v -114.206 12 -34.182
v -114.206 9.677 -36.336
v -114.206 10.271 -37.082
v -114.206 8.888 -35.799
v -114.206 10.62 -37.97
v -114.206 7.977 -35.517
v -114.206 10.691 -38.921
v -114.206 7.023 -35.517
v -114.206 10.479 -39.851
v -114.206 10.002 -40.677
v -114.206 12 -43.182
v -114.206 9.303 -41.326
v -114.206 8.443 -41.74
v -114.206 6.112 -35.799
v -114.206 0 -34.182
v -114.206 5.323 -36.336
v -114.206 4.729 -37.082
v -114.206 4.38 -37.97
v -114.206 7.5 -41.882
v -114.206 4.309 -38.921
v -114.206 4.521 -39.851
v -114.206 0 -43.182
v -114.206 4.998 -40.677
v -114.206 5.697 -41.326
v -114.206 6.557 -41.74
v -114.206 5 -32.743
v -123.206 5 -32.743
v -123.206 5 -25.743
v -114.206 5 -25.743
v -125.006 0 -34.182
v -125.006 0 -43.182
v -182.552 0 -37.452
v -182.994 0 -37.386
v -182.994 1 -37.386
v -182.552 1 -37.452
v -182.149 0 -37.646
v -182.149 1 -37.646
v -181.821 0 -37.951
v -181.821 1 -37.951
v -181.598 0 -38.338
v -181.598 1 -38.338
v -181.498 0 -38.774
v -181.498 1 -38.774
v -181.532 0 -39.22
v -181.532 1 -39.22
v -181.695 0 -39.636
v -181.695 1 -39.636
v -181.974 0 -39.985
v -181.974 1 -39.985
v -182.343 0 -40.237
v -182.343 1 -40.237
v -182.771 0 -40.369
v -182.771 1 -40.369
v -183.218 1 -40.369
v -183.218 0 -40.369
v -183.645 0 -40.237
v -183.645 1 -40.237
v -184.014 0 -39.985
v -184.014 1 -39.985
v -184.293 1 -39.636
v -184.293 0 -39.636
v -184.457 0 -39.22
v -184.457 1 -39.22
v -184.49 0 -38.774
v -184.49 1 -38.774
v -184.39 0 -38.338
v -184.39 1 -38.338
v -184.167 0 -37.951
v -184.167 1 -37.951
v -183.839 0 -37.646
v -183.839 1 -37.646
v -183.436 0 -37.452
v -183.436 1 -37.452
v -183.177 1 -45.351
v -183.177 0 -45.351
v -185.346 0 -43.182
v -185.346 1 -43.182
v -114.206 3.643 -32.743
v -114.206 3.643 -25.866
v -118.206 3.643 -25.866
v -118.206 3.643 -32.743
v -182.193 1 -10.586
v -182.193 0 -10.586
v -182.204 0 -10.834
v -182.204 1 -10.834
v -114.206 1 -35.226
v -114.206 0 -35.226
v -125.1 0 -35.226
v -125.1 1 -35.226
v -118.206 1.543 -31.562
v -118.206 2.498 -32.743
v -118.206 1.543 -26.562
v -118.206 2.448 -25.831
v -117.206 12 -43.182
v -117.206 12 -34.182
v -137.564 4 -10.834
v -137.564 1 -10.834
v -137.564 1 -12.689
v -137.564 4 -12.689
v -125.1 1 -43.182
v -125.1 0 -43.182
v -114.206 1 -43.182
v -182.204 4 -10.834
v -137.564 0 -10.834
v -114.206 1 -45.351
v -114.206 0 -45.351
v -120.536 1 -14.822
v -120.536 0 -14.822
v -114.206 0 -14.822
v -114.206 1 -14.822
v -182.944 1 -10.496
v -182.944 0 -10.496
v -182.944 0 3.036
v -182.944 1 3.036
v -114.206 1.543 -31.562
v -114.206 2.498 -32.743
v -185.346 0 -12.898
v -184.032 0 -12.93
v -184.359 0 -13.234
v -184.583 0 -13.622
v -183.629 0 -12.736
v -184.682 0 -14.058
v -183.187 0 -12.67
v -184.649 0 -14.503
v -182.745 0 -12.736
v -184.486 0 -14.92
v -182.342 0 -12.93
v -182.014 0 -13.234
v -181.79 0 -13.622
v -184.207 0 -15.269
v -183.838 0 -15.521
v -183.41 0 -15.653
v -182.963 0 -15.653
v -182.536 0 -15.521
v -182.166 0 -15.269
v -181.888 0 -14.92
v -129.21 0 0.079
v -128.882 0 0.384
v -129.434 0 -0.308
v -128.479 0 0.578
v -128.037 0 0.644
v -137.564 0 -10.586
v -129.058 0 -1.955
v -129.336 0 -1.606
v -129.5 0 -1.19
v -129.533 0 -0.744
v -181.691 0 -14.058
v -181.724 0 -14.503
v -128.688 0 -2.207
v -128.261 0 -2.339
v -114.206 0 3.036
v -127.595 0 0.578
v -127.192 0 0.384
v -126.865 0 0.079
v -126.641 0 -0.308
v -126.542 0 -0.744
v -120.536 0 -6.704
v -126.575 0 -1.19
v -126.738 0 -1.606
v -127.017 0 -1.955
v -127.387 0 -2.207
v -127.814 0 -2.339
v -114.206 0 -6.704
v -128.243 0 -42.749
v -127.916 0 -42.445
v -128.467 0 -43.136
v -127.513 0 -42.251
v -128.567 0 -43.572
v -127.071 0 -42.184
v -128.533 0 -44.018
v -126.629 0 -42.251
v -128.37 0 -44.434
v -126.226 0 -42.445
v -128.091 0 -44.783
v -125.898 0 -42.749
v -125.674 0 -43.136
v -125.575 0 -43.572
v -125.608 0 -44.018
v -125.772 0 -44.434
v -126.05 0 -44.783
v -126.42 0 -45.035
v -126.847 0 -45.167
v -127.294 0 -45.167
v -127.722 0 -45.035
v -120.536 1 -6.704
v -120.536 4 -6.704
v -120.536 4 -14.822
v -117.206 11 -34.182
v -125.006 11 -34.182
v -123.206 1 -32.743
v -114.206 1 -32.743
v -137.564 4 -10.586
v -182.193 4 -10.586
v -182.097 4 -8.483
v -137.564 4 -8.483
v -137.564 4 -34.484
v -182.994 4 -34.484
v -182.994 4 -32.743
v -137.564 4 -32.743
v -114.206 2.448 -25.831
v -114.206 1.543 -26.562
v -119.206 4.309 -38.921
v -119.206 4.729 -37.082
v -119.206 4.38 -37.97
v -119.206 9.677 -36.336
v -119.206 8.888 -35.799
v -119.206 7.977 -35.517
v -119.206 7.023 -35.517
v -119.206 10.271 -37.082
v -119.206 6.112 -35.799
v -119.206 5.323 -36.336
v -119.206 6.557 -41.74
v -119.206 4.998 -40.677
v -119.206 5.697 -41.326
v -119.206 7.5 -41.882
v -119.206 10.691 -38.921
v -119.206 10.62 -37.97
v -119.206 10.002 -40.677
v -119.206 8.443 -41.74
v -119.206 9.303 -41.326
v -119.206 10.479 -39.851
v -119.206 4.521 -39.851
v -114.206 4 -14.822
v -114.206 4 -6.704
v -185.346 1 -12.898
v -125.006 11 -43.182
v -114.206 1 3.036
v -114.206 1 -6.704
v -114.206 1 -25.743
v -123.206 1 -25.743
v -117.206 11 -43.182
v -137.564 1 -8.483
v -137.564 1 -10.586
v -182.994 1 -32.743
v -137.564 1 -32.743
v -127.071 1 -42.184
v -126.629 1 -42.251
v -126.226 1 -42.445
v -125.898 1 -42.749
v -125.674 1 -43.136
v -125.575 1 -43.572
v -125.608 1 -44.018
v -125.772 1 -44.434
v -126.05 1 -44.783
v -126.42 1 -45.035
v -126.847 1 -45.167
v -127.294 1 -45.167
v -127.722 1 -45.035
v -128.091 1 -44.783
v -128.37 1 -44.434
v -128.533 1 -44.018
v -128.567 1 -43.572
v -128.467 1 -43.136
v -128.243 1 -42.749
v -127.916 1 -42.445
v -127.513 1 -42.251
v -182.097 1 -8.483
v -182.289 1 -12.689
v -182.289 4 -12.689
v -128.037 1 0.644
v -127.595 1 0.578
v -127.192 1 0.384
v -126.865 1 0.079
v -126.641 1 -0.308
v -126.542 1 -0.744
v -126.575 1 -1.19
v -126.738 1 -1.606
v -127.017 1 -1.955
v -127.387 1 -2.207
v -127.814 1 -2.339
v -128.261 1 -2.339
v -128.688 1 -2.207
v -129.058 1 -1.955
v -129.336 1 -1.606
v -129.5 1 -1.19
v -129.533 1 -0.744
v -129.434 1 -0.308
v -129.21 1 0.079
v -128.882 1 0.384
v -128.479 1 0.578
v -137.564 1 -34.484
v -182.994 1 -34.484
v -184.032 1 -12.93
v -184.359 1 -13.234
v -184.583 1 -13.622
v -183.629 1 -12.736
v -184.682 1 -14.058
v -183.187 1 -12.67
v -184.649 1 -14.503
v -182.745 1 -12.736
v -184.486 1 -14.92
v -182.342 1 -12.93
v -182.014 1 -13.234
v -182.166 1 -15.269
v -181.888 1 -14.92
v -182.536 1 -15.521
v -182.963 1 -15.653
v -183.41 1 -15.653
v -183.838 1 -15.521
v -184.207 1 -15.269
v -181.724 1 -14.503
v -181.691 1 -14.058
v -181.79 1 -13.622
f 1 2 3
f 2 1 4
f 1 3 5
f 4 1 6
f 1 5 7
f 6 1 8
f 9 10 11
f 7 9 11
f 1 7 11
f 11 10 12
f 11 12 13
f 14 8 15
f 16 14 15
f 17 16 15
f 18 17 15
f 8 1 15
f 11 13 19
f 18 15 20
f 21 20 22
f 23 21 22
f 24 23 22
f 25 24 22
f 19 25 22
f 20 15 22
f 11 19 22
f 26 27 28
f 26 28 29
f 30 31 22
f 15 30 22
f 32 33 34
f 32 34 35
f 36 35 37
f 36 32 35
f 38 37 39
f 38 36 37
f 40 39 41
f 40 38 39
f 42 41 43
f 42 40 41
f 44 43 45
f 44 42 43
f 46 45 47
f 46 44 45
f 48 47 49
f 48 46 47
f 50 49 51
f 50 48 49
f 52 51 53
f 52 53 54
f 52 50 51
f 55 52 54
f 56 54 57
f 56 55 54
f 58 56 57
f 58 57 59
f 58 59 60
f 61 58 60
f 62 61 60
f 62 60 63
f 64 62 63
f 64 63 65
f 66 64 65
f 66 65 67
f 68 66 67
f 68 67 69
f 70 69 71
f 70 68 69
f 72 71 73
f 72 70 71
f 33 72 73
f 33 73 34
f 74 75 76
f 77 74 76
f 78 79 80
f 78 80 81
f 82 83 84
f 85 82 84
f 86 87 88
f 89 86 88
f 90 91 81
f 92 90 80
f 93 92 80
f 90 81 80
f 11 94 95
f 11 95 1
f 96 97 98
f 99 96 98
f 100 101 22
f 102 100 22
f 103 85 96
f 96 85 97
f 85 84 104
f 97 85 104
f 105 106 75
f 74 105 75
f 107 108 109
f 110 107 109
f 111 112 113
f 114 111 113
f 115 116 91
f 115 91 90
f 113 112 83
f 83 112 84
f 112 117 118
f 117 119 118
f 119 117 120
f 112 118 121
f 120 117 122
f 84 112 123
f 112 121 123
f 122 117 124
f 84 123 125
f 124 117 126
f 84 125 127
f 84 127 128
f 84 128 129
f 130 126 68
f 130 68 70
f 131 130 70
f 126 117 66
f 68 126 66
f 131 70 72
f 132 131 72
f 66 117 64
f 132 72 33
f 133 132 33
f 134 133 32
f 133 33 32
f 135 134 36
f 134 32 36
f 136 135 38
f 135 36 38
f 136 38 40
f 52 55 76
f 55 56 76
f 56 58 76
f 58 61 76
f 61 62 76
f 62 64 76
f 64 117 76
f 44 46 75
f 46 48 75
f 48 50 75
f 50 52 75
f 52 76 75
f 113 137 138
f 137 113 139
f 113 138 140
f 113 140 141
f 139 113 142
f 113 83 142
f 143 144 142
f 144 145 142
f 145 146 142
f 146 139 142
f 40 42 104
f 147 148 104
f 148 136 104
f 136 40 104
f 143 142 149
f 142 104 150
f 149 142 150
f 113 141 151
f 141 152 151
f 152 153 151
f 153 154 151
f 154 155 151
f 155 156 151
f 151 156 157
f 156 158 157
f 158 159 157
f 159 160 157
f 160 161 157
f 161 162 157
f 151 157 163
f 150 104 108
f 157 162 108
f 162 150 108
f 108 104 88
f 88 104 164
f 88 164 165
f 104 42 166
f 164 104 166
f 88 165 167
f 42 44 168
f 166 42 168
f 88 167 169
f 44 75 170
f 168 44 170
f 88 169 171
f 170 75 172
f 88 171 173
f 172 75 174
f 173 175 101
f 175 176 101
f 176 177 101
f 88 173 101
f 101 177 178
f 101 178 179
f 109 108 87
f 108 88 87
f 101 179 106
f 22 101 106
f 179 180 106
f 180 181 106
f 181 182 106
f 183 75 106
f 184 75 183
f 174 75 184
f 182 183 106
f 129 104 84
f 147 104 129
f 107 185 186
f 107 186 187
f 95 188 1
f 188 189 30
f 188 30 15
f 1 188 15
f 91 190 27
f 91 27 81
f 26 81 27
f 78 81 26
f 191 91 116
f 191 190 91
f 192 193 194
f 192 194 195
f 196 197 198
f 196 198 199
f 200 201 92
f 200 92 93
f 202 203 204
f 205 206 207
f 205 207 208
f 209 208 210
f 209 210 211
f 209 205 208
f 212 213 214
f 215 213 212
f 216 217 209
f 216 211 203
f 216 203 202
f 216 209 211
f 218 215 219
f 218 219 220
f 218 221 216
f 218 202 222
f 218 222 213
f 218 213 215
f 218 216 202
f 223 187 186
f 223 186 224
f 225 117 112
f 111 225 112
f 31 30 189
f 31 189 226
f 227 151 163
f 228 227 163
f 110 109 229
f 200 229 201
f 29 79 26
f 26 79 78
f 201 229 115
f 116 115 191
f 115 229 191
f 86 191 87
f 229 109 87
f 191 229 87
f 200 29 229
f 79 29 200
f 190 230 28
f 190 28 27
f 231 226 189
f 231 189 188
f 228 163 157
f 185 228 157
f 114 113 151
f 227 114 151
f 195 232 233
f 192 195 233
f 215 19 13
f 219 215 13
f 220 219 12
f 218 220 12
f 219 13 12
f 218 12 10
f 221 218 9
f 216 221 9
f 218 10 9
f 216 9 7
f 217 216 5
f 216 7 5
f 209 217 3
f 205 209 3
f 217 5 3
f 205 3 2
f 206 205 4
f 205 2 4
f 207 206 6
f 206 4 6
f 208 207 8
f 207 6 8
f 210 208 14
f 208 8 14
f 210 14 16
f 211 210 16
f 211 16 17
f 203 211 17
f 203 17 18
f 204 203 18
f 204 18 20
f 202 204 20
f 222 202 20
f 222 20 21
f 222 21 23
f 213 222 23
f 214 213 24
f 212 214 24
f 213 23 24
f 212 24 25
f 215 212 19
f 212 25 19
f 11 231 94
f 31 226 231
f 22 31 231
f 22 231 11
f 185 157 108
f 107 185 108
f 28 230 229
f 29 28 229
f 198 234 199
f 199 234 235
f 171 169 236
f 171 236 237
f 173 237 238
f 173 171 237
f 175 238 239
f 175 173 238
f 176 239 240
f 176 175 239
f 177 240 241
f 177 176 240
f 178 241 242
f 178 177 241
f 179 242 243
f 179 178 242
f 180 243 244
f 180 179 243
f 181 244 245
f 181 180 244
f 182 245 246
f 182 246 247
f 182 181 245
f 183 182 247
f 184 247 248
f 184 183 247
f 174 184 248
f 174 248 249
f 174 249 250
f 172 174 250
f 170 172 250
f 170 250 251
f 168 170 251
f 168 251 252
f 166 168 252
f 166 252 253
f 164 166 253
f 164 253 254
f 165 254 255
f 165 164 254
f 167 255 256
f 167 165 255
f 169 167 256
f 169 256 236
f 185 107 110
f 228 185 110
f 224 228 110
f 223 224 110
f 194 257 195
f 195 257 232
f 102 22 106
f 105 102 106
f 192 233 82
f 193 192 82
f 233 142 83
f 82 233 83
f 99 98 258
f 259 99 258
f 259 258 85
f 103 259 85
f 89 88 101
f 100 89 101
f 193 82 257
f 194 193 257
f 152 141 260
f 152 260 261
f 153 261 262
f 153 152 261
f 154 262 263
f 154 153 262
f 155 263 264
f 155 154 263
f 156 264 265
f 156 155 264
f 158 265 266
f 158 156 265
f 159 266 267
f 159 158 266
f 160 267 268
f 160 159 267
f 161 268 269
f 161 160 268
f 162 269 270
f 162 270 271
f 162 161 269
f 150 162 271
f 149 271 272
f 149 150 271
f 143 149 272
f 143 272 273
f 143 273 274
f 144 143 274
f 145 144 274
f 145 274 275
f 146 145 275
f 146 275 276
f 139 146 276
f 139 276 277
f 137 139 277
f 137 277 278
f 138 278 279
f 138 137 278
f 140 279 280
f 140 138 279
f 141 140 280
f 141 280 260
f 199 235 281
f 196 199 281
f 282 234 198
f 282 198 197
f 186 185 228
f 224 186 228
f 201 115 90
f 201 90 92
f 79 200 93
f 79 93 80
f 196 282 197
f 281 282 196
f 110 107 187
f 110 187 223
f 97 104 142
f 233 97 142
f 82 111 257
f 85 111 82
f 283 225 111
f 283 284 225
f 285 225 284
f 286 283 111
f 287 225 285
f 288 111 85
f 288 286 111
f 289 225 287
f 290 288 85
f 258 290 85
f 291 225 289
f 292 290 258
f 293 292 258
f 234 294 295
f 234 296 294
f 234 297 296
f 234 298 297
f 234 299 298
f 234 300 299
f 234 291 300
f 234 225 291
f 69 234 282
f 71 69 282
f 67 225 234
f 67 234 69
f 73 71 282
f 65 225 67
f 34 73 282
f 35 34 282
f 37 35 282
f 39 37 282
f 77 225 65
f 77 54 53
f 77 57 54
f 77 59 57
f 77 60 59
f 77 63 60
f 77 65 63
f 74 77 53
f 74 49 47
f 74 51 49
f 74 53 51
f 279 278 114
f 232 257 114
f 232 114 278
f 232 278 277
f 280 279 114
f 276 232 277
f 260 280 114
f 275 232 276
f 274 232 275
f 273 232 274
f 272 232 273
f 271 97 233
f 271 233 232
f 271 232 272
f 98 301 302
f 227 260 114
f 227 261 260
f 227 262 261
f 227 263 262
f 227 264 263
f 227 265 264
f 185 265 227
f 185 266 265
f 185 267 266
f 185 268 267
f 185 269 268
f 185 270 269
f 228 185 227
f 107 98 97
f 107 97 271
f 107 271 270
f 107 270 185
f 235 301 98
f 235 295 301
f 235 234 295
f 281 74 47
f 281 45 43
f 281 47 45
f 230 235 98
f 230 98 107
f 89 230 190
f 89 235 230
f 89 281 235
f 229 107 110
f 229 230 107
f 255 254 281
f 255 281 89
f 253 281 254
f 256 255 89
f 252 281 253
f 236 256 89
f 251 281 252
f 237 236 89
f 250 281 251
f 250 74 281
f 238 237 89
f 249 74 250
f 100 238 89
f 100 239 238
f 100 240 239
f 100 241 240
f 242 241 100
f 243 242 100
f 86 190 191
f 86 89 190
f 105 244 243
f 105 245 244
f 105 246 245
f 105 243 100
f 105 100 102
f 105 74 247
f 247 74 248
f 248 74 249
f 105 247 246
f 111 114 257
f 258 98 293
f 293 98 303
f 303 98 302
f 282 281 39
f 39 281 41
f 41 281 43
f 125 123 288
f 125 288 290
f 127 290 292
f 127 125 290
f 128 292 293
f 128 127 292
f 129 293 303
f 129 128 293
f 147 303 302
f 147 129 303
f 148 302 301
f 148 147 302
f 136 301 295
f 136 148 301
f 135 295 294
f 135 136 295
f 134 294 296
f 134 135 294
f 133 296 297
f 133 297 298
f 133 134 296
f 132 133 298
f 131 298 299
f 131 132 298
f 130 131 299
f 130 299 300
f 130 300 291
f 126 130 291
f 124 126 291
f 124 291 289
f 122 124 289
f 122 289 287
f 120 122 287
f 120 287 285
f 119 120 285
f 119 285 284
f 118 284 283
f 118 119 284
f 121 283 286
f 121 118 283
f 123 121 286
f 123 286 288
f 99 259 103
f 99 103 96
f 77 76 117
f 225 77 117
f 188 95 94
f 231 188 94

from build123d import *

# Parameters (mm, degrees)
CROQUIS2_R                   = 1.5
CROQUIS2_W                   = 45.430226109
CROQUIS2_H                   = 1.74059968
SALIENTE_EXTRUIR2_DEPTH      = 1
SALIENTE_EXTRUIR5_DEPTH      = 11
SALIENTE_EXTRUIR5_DEPTH_BACK = 1
CROQUIS3_W                   = 10.8
CROQUIS3_H                   = 9
CROQUIS4_R                   = 3.2
CORTAR_EXTRUIR1_DEPTH        = 5
CROQUIS5_W                   = 7.8
CROQUIS5_H                   = 9
CORTAR_EXTRUIR2_DEPTH        = 1
SALIENTE_EXTRUIR6_DEPTH      = 4
SALIENTE_EXTRUIR6_DEPTH_BACK = 1
CROQUIS6_W                   = 9
CROQUIS6_H                   = 7
CORTAR_EXTRUIR3_DEPTH        = 4
CROQUIS8_W                   = 6.329954447
CROQUIS8_H                   = 8.118219625
SALIENTE_EXTRUIR7_DEPTH      = 3
SALIENTE_EXTRUIR8_DEPTH      = 3
SALIENTE_EXTRUIR8_DEPTH_BACK = 1
CROQUIS9_W                   = 45.430226109
CROQUIS9_H                   = 1.74059968


with BuildPart() as part:
    # Croquis2 → Saliente-Extruir2 (new body)
    with BuildSketch(Plane(origin=(0, 0, 0), x_dir=(1, 0, 0), z_dir=(0, 1, 0))):
        Polygon((-114.205989543, 45.350793669), (-183.177349022, 45.350793669), (-185.346387965, 43.181754726), (-185.346387965, 12.898278129), (-182.944348972, 10.496239137), (-182.944348972, 8.483369714), (-182.944348972, -3.035939151), (-114.205989543, -3.035939151), (-114.205989543, 6.703917116), (-120.53594399, 6.703917116), (-120.53594399, 14.822136741), (-114.205989543, 14.822136741), (-114.205989543, 25.822407586), (-118.635147944, 25.822407586), (-118.635147944, 32.742977756), (-114.205989543, 32.742977756), (-114.205989543, 35.225683913), (-125.100189967, 35.225683913), (-125.100189967, 43.181754726), (-114.205989543, 43.181754726), align=None)
        with Locations(Location((-183.186680014, 14.169663208, 0), (0, 0, 270))):
            Circle(CROQUIS2_R, mode=Mode.SUBTRACT)
        Polygon((-182.192965891, 10.586368559), (-182.289134654, 12.689367405), (-137.563892409, 12.689367405), (-137.563892409, 10.586368559), (-137.563892409, 8.483369714), (-182.096797127, 8.483369714), align=None, mode=Mode.SUBTRACT)
        with Locations(Location((-128.03733826, 0.855831955, 0), (0, 0, 270))):
            Circle(CROQUIS2_R, mode=Mode.SUBTRACT)
        with Locations(Location((-182.994118518, 38.885795922, 0), (0, 0, 270))):
            Circle(CROQUIS2_R, mode=Mode.SUBTRACT)
        with Locations((-160.279005464, 33.613277596)):
            Rectangle(CROQUIS2_W, CROQUIS2_H, mode=Mode.SUBTRACT)
        with Locations(Location((-127.070714237, 43.683877878, 0), (0, 0, 270))):
            Circle(CROQUIS2_R, mode=Mode.SUBTRACT)
    extrude(amount=SALIENTE_EXTRUIR2_DEPTH)

    # Croquis6 → Saliente-Extruir6 (add, two sides: drawn at the far end of the back side and taken through both)
    with BuildSketch(Plane(origin=(0, 1, 0), x_dir=(1, 0, 0), z_dir=(0, 1, 0)).offset(-SALIENTE_EXTRUIR6_DEPTH_BACK)):
        with Locations((-118.705989543, 29.242977756)):
            Rectangle(CROQUIS6_W, CROQUIS6_H)
    extrude(amount=SALIENTE_EXTRUIR6_DEPTH + SALIENTE_EXTRUIR6_DEPTH_BACK)

    # Croquis7 → Cortar-Extruir3 (cut)
    with BuildSketch(Plane(origin=(-114.205989543, 0, 0), x_dir=(0, 0, -1), z_dir=(1, 0, 0))):
        Polygon((25.866485873, 3.643487769), (32.752542358, 3.643487769), (32.752542358, 2.505548171), (31.561801116, 1.543487769), (26.561801116, 1.543487769), (25.830702469, 2.448367867), align=None)
    extrude(amount=-CORTAR_EXTRUIR3_DEPTH, mode=Mode.SUBTRACT)

    # Croquis9 → Saliente-Extruir8 (add, two sides: drawn at the far end of the back side and taken through both)
    with BuildSketch(Plane(origin=(0, 1, 0), x_dir=(1, 0, 0), z_dir=(0, 1, 0)).offset(-SALIENTE_EXTRUIR8_DEPTH_BACK)):
        Polygon((-137.563892409, 10.833630724), (-137.563892409, 12.689367405), (-182.289134654, 12.689367405), (-182.204273028, 10.833630724), align=None)
        Polygon((-137.563892409, 8.483369714), (-137.563892409, 10.586368559), (-182.192965891, 10.586368559), (-182.096797127, 8.483369714), align=None)
        with Locations((-160.279005464, 33.613277596)):
            Rectangle(CROQUIS9_W, CROQUIS9_H)
    extrude(amount=SALIENTE_EXTRUIR8_DEPTH + SALIENTE_EXTRUIR8_DEPTH_BACK)


with BuildPart() as body_2:
    # Croquis3 → Saliente-Extruir5 (new, two sides: drawn at the far end of the back side and taken through both)
    with BuildSketch(Plane(origin=(0, 1, 0), x_dir=(1, 0, 0), z_dir=(0, 1, 0)).offset(-SALIENTE_EXTRUIR5_DEPTH_BACK)):
        with Locations((-119.605989543, 38.681754726)):
            Rectangle(CROQUIS3_W, CROQUIS3_H)
    extrude(amount=SALIENTE_EXTRUIR5_DEPTH + SALIENTE_EXTRUIR5_DEPTH_BACK)

    # Croquis4 → Cortar-Extruir1 (cut)
    with BuildSketch(Plane(origin=(-114.205989543, 0, 0), x_dir=(0, 0, -1), z_dir=(1, 0, 0))):
        with Locations((38.681754726, 7.5)):
            Circle(CROQUIS4_R)
    extrude(amount=-CORTAR_EXTRUIR1_DEPTH, mode=Mode.SUBTRACT)

    # Croquis5 → Cortar-Extruir2 (cut)
    with BuildSketch(Plane(origin=(0, 12, 0), x_dir=(1, 0, 0), z_dir=(0, 1, 0))):
        with Locations((-121.105989543, 38.681754726)):
            Rectangle(CROQUIS5_W, CROQUIS5_H)
    extrude(amount=-CORTAR_EXTRUIR2_DEPTH, mode=Mode.SUBTRACT)


with BuildPart() as body_3:
    # Croquis8 → Saliente-Extruir7 (new body)
    with BuildSketch(Plane(origin=(0, 1, 0), x_dir=(1, 0, 0), z_dir=(0, 1, 0))):
        with Locations((-117.370966767, 10.763026929)):
            Rectangle(CROQUIS8_W, CROQUIS8_H)
    extrude(amount=SALIENTE_EXTRUIR7_DEPTH)


solid = Compound([part.part, body_2.part, body_3.part])
